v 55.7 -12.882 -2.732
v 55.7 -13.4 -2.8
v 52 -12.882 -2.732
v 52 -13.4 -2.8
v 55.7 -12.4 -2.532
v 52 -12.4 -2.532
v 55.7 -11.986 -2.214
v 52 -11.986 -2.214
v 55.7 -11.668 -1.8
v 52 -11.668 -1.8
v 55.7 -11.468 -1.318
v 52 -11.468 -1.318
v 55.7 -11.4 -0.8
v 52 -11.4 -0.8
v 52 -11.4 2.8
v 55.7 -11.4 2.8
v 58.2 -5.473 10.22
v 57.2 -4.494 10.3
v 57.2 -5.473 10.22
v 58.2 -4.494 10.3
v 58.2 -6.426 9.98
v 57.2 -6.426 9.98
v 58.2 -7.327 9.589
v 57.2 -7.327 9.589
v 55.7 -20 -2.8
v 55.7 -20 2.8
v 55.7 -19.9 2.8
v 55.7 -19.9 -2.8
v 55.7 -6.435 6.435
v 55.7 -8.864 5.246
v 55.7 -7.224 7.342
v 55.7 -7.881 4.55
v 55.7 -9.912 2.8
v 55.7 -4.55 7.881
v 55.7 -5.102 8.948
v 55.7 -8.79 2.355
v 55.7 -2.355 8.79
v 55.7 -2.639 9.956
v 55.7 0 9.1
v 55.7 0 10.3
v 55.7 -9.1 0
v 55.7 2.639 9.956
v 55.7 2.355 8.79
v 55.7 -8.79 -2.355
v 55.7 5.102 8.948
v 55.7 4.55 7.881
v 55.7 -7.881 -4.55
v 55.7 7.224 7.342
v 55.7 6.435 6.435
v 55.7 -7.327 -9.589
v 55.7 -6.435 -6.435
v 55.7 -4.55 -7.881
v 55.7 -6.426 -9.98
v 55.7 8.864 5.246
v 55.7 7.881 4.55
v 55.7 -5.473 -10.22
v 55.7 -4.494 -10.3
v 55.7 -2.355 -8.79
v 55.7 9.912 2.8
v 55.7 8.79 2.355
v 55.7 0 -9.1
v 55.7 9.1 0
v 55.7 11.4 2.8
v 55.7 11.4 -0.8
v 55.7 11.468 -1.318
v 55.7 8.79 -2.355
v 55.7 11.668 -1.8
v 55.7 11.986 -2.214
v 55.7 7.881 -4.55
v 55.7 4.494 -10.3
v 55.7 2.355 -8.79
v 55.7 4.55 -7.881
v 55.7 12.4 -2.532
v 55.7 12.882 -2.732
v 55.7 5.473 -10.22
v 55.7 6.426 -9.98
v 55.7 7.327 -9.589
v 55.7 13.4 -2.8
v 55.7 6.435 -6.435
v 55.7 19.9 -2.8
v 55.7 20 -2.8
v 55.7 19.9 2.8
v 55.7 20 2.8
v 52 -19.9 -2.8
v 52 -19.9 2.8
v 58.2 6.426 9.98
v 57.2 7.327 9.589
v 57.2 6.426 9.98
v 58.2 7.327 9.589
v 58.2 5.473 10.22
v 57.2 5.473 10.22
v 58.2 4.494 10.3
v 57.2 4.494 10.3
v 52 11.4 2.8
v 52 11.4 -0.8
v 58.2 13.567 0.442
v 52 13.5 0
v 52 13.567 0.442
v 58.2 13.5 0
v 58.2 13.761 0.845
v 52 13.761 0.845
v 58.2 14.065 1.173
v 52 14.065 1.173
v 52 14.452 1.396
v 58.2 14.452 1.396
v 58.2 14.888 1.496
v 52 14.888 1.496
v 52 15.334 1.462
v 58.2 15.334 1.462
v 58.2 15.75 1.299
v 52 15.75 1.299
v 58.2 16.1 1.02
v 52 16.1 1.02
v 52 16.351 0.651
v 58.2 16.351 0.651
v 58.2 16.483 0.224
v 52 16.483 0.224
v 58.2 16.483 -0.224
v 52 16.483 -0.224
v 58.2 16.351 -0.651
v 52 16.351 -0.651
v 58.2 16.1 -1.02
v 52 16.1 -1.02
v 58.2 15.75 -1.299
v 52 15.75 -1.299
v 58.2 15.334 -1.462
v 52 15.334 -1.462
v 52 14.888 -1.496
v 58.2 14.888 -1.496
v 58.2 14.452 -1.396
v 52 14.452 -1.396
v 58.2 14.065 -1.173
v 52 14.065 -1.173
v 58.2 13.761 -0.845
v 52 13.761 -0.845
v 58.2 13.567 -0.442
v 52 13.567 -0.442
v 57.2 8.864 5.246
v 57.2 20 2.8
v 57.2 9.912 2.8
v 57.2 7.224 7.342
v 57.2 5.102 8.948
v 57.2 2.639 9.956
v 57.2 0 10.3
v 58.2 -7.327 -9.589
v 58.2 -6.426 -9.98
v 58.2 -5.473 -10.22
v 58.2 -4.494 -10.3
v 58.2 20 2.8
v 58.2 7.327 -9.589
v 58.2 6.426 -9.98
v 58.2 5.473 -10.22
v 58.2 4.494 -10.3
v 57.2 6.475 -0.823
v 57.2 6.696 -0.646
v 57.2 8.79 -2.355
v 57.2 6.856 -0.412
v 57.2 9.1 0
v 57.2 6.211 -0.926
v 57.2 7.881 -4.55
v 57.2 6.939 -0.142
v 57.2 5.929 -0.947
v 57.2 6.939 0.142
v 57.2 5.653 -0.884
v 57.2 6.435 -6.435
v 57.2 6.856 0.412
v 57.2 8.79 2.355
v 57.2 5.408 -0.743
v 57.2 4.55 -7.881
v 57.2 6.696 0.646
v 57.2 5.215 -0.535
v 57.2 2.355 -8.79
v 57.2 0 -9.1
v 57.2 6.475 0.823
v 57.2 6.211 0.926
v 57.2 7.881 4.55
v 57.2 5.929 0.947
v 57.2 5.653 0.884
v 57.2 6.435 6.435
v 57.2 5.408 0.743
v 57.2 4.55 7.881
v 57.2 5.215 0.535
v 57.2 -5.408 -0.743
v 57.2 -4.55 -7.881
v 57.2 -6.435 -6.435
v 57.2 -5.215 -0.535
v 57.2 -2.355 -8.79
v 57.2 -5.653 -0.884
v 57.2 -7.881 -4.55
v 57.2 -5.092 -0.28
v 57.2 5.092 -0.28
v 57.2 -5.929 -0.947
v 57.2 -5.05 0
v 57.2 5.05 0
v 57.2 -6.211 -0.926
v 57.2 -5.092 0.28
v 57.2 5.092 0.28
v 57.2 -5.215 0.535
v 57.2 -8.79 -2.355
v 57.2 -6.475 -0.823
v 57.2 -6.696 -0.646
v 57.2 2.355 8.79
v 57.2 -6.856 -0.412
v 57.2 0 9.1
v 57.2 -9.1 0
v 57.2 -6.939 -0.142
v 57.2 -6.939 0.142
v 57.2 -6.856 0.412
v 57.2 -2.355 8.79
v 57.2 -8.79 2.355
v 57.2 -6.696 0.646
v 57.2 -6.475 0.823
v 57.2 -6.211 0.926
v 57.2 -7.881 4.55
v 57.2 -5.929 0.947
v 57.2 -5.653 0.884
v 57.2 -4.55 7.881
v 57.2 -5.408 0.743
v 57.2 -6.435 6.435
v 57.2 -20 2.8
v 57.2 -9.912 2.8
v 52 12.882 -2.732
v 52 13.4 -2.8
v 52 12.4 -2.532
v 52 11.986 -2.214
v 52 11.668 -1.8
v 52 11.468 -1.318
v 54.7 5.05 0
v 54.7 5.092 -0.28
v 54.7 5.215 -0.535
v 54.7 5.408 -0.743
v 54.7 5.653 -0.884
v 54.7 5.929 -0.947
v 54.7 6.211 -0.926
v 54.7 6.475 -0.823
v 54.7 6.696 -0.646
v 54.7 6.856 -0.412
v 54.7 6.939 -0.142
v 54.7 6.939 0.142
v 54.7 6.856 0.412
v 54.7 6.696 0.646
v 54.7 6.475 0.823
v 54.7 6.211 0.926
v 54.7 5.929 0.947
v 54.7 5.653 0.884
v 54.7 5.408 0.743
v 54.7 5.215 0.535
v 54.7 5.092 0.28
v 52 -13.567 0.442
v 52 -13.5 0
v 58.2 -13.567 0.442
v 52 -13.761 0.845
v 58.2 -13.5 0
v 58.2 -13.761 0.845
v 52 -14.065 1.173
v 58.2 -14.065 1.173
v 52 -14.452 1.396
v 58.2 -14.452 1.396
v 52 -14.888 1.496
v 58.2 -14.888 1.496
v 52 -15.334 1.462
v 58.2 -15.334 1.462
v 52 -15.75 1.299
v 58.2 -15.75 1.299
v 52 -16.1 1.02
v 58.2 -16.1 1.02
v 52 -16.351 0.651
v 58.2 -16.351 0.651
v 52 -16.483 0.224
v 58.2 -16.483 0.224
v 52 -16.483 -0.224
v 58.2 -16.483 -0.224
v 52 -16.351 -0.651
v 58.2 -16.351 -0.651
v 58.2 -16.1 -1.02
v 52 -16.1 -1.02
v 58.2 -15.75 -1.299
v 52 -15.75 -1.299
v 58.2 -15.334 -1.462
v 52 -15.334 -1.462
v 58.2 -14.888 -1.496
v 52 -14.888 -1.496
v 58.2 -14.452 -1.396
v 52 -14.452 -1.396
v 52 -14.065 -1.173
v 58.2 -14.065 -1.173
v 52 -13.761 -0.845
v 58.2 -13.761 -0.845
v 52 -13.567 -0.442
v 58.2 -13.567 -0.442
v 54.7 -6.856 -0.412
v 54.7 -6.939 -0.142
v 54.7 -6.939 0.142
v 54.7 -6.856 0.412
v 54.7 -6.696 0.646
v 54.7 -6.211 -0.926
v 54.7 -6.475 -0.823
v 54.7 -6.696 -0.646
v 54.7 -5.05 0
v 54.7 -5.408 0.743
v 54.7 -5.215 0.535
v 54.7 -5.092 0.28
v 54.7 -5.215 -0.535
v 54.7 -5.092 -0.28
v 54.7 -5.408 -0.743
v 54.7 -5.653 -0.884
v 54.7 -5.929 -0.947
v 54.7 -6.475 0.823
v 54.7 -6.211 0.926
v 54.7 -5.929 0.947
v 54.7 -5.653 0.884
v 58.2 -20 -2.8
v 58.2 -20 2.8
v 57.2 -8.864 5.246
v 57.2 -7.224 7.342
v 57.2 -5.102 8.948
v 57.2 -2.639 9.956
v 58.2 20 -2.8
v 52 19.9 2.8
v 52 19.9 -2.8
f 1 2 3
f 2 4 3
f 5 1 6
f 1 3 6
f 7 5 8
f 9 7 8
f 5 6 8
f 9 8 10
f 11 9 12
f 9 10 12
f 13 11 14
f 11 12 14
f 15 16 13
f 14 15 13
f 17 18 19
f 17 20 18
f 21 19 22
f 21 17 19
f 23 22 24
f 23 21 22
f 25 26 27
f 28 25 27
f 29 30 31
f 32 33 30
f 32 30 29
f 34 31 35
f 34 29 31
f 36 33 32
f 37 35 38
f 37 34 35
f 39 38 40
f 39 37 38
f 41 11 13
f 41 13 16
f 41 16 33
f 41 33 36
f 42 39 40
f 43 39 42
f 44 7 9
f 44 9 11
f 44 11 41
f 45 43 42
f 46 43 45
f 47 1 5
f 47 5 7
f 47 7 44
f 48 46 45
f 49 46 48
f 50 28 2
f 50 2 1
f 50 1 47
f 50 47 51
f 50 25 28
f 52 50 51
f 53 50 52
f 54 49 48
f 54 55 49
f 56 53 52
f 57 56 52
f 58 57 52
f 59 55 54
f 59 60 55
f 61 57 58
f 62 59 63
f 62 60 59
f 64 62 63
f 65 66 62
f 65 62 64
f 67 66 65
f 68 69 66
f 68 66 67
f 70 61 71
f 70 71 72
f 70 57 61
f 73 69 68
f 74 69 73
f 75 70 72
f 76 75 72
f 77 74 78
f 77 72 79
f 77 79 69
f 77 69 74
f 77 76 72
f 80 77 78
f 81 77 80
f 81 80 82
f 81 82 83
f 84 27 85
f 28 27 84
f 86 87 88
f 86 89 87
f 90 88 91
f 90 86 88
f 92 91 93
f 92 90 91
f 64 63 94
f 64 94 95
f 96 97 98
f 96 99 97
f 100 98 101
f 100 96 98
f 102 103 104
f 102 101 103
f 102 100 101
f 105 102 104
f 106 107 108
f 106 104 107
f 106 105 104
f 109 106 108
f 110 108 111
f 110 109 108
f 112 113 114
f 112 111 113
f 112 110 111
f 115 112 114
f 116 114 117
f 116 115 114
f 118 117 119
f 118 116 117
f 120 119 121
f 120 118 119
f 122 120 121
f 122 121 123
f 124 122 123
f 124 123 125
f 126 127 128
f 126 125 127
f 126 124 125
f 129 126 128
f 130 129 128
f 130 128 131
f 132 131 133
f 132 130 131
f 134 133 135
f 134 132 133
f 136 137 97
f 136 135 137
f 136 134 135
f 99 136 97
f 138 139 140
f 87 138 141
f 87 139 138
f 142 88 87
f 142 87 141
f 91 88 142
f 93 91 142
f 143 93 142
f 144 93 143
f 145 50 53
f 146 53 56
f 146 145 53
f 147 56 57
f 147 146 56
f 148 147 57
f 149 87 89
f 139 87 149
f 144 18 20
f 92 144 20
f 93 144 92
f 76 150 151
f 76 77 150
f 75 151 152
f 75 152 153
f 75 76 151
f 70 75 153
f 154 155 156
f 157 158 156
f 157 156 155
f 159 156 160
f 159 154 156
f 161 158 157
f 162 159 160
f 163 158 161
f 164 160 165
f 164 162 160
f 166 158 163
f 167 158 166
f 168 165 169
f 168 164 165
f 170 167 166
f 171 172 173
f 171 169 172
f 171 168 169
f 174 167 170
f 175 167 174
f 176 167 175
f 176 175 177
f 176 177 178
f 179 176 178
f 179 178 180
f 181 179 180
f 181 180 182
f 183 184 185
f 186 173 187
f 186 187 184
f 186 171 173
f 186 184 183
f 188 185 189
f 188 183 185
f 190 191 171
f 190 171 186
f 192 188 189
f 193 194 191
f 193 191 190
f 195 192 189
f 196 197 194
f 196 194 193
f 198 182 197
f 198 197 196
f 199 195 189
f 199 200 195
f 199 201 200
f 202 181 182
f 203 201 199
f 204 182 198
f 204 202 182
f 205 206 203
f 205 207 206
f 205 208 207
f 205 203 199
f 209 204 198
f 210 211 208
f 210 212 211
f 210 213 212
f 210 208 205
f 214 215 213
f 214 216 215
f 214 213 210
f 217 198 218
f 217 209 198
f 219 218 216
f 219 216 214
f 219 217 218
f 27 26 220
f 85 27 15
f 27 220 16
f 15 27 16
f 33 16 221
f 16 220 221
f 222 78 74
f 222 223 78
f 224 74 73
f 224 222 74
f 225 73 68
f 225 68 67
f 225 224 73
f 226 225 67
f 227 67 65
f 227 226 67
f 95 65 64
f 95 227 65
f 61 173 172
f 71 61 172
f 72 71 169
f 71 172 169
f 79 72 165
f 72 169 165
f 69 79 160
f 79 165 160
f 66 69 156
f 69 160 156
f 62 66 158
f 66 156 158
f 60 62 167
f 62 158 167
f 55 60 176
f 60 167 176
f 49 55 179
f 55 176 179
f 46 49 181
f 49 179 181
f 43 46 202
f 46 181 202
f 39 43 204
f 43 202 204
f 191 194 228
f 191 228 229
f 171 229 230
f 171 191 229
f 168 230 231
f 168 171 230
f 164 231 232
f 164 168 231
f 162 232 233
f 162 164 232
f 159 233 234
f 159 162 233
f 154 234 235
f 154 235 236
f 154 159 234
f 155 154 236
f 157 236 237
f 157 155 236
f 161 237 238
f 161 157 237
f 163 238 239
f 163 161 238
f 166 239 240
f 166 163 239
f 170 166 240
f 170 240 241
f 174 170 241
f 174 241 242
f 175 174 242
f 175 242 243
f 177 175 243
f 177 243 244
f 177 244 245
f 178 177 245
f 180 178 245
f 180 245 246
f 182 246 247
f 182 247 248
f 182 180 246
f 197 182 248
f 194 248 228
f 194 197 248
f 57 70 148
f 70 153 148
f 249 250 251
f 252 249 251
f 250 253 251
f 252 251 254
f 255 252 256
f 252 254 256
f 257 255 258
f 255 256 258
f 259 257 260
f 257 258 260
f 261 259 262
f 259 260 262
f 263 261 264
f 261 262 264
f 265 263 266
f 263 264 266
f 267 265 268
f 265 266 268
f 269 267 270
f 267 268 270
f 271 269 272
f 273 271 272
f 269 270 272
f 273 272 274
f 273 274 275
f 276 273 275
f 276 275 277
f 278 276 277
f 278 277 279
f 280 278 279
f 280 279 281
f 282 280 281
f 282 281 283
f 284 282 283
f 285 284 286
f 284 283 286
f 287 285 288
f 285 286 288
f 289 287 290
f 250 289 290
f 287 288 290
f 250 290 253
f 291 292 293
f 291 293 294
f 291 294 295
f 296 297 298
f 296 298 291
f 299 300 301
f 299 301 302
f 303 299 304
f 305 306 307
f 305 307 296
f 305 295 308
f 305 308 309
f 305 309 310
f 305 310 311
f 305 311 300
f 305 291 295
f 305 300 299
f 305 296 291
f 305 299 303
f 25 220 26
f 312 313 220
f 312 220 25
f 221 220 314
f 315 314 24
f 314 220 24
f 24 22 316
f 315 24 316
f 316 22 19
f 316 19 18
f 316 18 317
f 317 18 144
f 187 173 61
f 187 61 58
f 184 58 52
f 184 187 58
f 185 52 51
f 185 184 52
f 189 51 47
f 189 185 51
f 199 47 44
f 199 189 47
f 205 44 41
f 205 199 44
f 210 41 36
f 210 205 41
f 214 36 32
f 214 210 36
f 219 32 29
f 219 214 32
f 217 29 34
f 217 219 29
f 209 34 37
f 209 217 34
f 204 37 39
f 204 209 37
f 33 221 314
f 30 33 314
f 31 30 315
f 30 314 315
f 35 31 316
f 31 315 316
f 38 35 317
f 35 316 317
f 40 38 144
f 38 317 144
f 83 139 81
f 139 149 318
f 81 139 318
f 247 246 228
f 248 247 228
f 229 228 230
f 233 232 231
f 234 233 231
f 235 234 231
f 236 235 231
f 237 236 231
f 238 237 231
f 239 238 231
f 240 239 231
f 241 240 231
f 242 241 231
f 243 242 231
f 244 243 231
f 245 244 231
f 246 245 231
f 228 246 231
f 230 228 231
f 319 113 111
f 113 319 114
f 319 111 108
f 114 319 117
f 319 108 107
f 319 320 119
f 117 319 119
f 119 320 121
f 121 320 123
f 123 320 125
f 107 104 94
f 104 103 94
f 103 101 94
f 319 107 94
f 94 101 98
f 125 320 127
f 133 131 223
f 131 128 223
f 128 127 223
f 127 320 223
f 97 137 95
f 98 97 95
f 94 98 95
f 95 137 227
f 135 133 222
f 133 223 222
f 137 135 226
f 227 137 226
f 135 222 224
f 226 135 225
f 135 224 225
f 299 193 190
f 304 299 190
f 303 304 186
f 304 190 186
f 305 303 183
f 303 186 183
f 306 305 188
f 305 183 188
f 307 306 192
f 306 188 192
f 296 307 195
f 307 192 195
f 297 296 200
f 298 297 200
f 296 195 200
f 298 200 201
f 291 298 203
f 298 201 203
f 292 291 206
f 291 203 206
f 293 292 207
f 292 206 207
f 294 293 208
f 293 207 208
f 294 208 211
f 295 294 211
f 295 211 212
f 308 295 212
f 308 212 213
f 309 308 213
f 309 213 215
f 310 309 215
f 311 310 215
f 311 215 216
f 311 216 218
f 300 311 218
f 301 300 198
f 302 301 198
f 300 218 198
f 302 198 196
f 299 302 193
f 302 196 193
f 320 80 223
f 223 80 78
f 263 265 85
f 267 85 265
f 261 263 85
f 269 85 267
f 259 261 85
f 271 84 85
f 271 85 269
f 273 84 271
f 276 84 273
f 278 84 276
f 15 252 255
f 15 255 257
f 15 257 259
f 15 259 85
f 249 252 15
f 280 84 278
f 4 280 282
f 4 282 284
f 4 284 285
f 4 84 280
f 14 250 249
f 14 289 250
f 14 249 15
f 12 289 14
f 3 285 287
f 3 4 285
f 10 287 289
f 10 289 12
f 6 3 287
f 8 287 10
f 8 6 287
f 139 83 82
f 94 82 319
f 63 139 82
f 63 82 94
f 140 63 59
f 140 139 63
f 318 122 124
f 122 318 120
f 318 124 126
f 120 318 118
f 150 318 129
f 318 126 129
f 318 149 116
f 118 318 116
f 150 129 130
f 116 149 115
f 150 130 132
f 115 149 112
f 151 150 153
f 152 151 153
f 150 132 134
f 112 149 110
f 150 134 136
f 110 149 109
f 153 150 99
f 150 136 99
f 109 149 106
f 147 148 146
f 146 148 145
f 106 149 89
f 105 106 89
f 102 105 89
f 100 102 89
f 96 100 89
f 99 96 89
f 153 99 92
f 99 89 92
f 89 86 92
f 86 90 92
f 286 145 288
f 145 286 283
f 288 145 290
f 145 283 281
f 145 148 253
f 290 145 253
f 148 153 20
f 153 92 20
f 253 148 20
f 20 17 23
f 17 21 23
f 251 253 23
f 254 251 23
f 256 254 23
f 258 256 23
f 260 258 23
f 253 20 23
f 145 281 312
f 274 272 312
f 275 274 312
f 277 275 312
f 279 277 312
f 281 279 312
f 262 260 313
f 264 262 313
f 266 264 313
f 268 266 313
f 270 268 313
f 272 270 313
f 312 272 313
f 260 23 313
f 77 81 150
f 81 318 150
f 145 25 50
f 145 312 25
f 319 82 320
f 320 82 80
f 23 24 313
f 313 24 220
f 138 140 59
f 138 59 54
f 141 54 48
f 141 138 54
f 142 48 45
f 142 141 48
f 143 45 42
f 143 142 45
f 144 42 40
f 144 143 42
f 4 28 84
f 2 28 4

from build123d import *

# Parameters (mm, degrees)
PAD099_DEPTH    = 1
SKETCH286_R     = 0.95
PAD100_DEPTH    = 2.5
PAD101_DEPTH    = 1.5
SKETCH288_W     = 8.5
SKETCH288_H     = 5.6
PAD102_DEPTH    = 5.2
SKETCH289_R     = 1.5
POCKET169_DEPTH = 15
FILLET002_R     = 6
FILLET004_R     = 2


with BuildPart() as part:
    # Sketch277 → Pad099 (new body)
    with BuildSketch(Plane.YZ.offset(57.2)):
        Polygon((-20, 2.8), (-20, -2.8), (-6, -10.3), (0, -10.3), (0, 10.3), (-6, 10.3), align=None)
    pad099 = extrude(amount=PAD099_DEPTH)

    # Sketch286 (on Face7 of Pad099) → Pad100 (join)
    with BuildSketch(Plane(origin=(57.2, 0, 0), x_dir=(0, 1, 0), z_dir=(-1, 0, 0))):
        with Locations((-6, 0)):
            Circle(SKETCH286_R)
    pad100 = extrude(amount=PAD100_DEPTH)

    # Sketch287 (on Face4 of Pad100) → Pad101 (join)
    with BuildSketch(Plane(origin=(57.2, 0, 0), x_dir=(0, 1, 0), z_dir=(-1, 0, 0))):
        with BuildLine():
            Line((-20, -2.8), (-20, 2.8))
            Line((-20, 2.8), (-6, 10.3))
            Line((-6, 10.3), (0, 10.3))
            Line((0, 9.1), (0, 10.3))
            ThreePointArc((0, 9.1), (-9.1, 0), (0, -9.1))
            Line((0, -9.1), (0, -10.3))
            ThreePointArc((-9.9121138008, -2.8), (-6.2149014473, -8.2137080542), (0, -10.3))
            Line((-20, -2.8), (-9.9121138008, -2.8))
        make_face()
    pad101 = extrude(amount=PAD101_DEPTH)

    # Sketch288 (on Face18 of Pad101) → Pad102 (join)
    with BuildSketch(Plane(origin=(57.2, 0, 0), x_dir=(0, 1, 0), z_dir=(-1, 0, 0))):
        with Locations((-15.65, 0)):
            Rectangle(SKETCH288_W, SKETCH288_H)
    pad102 = extrude(amount=PAD102_DEPTH)

    # Sketch289 (on Face5 of Pad102) → Pocket169 (cut, symmetric)
    with BuildSketch(Plane.YZ.offset(58.2)):
        with Locations((-15, 0)):
            Circle(SKETCH289_R)
    pocket169 = extrude(amount=POCKET169_DEPTH, both=True, mode=Mode.SUBTRACT)

    # Mirrored011: Pad099, Pad100, Pad101, Pad102, Pocket169 across Sketch277 V_Axis
    add(pad099.mirror(Plane(origin=(57.2, 0, 0), x_dir=(1, 0, 0), z_dir=(0, 1, 0))))
    add(pad100.mirror(Plane(origin=(57.2, 0, 0), x_dir=(1, 0, 0), z_dir=(0, 1, 0))))
    add(pad101.mirror(Plane(origin=(57.2, 0, 0), x_dir=(1, 0, 0), z_dir=(0, 1, 0))))
    add(pad102.mirror(Plane(origin=(57.2, 0, 0), x_dir=(1, 0, 0), z_dir=(0, 1, 0))))
    add(pocket169.mirror(Plane(origin=(57.2, 0, 0), x_dir=(1, 0, 0), z_dir=(0, 1, 0))), mode=Mode.SUBTRACT)

    # Fillet002
    fillet002_edges = [part.edges().sort_by_distance(p)[0] for p in [
        (57.7, -6, -10.3),
        (56.45, -6, -10.3),
        (57.7, 6, -10.3),
        (56.45, 6, -10.3),
        (57.7, -6, 10.3),
        (57.7, 6, 10.3),
    ]]
    fillet(fillet002_edges, radius=FILLET002_R)

    # Fillet004
    fillet004_edges = [part.edges().sort_by_distance(p)[0] for p in [
        (53.85, 11.4, -2.8),
        (53.85, -11.4, -2.8),
    ]]
    fillet(fillet004_edges, radius=FILLET004_R)


solid = part.part
